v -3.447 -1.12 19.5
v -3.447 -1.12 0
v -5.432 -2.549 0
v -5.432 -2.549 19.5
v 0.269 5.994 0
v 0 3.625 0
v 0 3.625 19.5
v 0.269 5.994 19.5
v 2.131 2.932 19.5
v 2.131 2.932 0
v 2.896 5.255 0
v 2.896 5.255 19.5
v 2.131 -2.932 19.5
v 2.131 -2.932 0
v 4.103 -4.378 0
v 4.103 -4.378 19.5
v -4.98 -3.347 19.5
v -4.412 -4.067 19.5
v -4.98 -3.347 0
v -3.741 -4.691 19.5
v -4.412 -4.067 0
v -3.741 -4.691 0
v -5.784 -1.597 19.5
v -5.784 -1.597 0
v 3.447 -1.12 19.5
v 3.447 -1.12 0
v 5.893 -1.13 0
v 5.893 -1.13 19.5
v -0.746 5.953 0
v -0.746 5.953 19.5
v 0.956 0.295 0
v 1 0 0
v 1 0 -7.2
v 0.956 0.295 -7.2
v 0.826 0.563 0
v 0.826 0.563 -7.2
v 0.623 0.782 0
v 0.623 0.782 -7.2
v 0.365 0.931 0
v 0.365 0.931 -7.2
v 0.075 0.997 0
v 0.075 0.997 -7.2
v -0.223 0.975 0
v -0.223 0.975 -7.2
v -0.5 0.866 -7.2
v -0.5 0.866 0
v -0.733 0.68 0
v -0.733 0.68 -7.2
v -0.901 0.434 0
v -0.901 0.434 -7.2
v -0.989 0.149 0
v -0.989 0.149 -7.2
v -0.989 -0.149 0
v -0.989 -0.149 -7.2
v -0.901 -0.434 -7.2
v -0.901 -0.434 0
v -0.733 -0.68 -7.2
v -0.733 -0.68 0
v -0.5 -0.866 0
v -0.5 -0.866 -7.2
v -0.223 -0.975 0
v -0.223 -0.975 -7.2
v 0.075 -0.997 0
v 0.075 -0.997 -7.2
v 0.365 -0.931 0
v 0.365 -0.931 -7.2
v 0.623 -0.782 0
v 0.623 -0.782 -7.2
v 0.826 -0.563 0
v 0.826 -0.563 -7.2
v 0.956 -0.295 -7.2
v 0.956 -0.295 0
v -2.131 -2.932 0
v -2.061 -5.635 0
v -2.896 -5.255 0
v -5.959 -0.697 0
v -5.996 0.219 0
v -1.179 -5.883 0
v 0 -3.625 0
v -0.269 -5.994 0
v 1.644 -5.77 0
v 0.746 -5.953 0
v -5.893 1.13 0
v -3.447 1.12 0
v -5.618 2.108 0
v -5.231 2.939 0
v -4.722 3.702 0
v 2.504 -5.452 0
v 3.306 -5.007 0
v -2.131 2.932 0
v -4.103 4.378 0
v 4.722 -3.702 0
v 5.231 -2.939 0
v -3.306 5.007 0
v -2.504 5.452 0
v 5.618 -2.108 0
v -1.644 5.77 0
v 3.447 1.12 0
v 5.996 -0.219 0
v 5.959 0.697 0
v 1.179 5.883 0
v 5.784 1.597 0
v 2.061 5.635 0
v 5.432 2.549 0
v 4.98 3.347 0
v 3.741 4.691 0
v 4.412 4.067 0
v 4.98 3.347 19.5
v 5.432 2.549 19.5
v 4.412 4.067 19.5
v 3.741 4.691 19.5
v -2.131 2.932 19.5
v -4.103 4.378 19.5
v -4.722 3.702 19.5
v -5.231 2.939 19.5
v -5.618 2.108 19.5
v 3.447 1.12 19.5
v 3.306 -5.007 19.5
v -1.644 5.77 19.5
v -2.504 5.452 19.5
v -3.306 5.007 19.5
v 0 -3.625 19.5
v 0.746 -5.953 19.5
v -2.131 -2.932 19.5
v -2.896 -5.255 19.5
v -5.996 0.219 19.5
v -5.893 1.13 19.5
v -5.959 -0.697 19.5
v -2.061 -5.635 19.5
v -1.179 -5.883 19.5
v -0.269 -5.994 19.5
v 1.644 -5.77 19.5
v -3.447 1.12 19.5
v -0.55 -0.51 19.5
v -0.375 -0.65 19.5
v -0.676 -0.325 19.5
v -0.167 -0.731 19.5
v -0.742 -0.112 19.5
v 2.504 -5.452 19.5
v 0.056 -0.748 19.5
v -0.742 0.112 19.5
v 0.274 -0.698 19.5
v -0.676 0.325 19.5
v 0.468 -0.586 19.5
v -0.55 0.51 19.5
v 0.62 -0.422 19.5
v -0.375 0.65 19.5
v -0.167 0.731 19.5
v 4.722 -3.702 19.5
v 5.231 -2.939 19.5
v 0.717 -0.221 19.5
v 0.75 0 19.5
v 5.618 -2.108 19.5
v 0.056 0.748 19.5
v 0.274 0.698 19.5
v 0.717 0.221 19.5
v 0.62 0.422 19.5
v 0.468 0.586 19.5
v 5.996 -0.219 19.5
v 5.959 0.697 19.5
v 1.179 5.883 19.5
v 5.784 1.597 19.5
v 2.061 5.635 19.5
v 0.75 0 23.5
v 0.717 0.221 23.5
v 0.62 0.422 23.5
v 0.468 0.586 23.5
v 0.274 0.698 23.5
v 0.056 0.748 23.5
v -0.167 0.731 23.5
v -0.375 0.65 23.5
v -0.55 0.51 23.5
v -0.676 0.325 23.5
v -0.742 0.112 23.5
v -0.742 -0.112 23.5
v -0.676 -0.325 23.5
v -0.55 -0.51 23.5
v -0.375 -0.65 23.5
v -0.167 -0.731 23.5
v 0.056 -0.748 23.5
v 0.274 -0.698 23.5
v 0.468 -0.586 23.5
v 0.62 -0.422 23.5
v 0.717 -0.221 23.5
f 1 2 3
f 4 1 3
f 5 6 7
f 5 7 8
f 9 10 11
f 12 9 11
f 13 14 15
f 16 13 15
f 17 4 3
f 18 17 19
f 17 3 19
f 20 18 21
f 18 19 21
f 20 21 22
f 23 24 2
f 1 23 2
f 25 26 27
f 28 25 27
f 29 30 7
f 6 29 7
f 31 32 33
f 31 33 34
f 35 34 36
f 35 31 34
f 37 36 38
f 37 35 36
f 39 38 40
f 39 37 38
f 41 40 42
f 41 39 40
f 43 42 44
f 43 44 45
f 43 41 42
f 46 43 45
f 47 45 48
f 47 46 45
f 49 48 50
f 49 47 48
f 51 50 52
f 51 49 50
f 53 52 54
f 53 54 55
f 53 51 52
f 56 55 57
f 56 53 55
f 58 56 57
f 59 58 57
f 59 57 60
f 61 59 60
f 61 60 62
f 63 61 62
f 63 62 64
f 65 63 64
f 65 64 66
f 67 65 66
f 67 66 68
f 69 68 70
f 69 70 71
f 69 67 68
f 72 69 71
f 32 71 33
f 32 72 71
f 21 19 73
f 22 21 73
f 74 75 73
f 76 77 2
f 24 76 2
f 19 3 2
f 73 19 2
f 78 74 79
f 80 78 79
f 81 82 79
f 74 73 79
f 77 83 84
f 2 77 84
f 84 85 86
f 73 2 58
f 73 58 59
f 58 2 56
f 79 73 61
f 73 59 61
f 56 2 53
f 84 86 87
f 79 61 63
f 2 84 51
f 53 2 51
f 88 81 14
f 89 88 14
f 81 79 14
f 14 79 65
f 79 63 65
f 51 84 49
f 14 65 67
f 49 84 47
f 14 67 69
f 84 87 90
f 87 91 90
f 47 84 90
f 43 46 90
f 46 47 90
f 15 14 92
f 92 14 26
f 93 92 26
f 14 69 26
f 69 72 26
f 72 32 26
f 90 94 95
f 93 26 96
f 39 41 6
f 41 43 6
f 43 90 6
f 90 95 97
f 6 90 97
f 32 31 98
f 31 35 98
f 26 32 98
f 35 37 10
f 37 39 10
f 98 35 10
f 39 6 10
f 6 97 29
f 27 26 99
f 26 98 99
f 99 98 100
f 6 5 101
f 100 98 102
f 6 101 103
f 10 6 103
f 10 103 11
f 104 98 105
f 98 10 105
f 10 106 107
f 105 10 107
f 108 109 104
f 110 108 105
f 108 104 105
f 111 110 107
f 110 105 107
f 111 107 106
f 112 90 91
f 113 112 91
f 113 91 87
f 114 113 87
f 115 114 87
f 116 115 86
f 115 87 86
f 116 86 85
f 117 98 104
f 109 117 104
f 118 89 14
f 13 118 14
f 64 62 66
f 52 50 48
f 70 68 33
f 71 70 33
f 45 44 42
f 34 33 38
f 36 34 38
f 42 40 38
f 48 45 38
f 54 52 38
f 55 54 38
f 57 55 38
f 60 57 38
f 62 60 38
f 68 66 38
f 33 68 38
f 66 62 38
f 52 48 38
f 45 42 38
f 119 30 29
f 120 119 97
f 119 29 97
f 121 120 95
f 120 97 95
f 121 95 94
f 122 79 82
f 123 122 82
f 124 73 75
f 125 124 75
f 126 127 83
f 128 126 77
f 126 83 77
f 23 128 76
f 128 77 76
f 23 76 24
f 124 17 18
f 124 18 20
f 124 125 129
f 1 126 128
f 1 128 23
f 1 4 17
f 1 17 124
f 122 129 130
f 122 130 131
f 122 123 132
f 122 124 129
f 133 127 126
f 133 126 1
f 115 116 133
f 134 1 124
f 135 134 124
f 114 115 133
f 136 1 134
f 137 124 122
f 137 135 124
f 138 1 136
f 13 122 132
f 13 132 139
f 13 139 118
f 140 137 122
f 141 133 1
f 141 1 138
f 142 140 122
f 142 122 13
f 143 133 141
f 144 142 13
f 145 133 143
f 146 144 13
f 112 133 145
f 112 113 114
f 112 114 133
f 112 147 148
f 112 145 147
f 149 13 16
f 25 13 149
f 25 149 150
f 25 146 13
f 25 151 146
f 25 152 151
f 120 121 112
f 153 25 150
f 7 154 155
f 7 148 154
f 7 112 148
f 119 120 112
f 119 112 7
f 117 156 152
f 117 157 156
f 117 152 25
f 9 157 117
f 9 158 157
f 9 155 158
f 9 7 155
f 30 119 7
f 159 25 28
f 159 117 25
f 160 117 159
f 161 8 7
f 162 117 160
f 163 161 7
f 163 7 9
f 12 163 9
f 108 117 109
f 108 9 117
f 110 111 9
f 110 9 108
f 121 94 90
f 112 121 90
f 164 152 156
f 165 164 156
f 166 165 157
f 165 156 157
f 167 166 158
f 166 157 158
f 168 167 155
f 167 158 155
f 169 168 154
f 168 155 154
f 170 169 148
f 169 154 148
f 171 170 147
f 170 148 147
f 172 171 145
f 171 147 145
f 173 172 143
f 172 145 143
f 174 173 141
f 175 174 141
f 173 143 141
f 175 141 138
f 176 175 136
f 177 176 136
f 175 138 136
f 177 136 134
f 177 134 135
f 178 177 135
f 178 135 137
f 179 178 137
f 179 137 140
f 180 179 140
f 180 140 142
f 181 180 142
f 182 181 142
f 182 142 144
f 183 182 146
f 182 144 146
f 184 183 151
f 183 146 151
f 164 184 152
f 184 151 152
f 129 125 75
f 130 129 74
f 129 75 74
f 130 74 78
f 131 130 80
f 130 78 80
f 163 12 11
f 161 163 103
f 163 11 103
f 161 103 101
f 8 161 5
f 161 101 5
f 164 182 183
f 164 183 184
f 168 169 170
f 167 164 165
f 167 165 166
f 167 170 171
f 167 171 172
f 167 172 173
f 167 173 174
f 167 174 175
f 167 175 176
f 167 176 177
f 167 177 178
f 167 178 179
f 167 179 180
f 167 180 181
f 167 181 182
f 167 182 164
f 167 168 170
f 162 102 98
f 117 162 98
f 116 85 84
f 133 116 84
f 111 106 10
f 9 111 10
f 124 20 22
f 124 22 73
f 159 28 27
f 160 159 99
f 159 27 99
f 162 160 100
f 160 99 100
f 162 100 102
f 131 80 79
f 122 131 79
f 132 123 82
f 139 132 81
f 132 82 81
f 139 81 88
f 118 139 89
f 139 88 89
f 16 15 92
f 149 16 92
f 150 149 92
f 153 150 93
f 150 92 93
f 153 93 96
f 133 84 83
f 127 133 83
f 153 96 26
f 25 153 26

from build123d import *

# Parameters (mm, degrees)
SKETCH1_R           = 6
BOSS_EXTRUDE1_DEPTH = 19.5
SKETCH1_3_R         = 1
BOSS_EXTRUDE2_DEPTH = 7.2
CUT_EXTRUDE4_DEPTH  = 55
SKETCH2_R           = 0.75
BOSS_EXTRUDE3_DEPTH = 4


with BuildPart() as part:
    # Sketch1 → Boss-Extrude1 (new body)
    with BuildSketch(Plane.XY):
        Circle(SKETCH1_R)
    extrude(amount=BOSS_EXTRUDE1_DEPTH)

    # Sketch1<3> → Boss-Extrude2 (add)
    with BuildSketch(Plane.XY):
        Circle(SKETCH1_3_R)
    extrude(amount=-BOSS_EXTRUDE2_DEPTH)

    # Sketch1<6> → Cut-Extrude4 (cut)
    with BuildSketch(Plane.XY):
        Polygon((0, 3.624712615), (0.894290994, 11.509067598), (-2.470474832, 11.33660338), align=None)
        Polygon((4.664832155, 10.623613465), (7.488356813, 8.785380219), (2.130552619, 2.932454105), align=None)
        Polygon((10.01833181, 5.85276429), (11.222124851, 2.7059762), (3.447306552, 1.120097798), align=None)
        Polygon((11.545169224, -1.153641916), (10.669422621, -4.407018754), (3.447306552, -1.120097798), align=None)
        Polygon((8.662144401, -7.71939612), (6.04136359, -9.836682333), (2.130552619, -2.932454105), align=None)
        Polygon((2.470474832, -11.33660338), (-0.894290994, -11.509067598), (0, -3.624712615), align=None)
        Polygon((-4.664832155, -10.623613465), (-7.488356813, -8.785380219), (-2.130552619, -2.932454105), align=None)
        Polygon((-10.01833181, -5.85276429), (-11.222124851, -2.7059762), (-3.447306552, -1.120097798), align=None)
        Polygon((-11.545169224, 1.153641916), (-10.669422621, 4.407018754), (-3.447306552, 1.120097798), align=None)
        Polygon((-8.662144401, 7.71939612), (-6.04136359, 9.836682333), (-2.130552619, 2.932454105), align=None)
    extrude(amount=CUT_EXTRUDE4_DEPTH, mode=Mode.SUBTRACT)

    # Sketch2 → Boss-Extrude3 (add)
    with BuildSketch(Plane.XY.offset(19.5)):
        Circle(SKETCH2_R)
    extrude(amount=BOSS_EXTRUDE3_DEPTH)


solid = part.part
